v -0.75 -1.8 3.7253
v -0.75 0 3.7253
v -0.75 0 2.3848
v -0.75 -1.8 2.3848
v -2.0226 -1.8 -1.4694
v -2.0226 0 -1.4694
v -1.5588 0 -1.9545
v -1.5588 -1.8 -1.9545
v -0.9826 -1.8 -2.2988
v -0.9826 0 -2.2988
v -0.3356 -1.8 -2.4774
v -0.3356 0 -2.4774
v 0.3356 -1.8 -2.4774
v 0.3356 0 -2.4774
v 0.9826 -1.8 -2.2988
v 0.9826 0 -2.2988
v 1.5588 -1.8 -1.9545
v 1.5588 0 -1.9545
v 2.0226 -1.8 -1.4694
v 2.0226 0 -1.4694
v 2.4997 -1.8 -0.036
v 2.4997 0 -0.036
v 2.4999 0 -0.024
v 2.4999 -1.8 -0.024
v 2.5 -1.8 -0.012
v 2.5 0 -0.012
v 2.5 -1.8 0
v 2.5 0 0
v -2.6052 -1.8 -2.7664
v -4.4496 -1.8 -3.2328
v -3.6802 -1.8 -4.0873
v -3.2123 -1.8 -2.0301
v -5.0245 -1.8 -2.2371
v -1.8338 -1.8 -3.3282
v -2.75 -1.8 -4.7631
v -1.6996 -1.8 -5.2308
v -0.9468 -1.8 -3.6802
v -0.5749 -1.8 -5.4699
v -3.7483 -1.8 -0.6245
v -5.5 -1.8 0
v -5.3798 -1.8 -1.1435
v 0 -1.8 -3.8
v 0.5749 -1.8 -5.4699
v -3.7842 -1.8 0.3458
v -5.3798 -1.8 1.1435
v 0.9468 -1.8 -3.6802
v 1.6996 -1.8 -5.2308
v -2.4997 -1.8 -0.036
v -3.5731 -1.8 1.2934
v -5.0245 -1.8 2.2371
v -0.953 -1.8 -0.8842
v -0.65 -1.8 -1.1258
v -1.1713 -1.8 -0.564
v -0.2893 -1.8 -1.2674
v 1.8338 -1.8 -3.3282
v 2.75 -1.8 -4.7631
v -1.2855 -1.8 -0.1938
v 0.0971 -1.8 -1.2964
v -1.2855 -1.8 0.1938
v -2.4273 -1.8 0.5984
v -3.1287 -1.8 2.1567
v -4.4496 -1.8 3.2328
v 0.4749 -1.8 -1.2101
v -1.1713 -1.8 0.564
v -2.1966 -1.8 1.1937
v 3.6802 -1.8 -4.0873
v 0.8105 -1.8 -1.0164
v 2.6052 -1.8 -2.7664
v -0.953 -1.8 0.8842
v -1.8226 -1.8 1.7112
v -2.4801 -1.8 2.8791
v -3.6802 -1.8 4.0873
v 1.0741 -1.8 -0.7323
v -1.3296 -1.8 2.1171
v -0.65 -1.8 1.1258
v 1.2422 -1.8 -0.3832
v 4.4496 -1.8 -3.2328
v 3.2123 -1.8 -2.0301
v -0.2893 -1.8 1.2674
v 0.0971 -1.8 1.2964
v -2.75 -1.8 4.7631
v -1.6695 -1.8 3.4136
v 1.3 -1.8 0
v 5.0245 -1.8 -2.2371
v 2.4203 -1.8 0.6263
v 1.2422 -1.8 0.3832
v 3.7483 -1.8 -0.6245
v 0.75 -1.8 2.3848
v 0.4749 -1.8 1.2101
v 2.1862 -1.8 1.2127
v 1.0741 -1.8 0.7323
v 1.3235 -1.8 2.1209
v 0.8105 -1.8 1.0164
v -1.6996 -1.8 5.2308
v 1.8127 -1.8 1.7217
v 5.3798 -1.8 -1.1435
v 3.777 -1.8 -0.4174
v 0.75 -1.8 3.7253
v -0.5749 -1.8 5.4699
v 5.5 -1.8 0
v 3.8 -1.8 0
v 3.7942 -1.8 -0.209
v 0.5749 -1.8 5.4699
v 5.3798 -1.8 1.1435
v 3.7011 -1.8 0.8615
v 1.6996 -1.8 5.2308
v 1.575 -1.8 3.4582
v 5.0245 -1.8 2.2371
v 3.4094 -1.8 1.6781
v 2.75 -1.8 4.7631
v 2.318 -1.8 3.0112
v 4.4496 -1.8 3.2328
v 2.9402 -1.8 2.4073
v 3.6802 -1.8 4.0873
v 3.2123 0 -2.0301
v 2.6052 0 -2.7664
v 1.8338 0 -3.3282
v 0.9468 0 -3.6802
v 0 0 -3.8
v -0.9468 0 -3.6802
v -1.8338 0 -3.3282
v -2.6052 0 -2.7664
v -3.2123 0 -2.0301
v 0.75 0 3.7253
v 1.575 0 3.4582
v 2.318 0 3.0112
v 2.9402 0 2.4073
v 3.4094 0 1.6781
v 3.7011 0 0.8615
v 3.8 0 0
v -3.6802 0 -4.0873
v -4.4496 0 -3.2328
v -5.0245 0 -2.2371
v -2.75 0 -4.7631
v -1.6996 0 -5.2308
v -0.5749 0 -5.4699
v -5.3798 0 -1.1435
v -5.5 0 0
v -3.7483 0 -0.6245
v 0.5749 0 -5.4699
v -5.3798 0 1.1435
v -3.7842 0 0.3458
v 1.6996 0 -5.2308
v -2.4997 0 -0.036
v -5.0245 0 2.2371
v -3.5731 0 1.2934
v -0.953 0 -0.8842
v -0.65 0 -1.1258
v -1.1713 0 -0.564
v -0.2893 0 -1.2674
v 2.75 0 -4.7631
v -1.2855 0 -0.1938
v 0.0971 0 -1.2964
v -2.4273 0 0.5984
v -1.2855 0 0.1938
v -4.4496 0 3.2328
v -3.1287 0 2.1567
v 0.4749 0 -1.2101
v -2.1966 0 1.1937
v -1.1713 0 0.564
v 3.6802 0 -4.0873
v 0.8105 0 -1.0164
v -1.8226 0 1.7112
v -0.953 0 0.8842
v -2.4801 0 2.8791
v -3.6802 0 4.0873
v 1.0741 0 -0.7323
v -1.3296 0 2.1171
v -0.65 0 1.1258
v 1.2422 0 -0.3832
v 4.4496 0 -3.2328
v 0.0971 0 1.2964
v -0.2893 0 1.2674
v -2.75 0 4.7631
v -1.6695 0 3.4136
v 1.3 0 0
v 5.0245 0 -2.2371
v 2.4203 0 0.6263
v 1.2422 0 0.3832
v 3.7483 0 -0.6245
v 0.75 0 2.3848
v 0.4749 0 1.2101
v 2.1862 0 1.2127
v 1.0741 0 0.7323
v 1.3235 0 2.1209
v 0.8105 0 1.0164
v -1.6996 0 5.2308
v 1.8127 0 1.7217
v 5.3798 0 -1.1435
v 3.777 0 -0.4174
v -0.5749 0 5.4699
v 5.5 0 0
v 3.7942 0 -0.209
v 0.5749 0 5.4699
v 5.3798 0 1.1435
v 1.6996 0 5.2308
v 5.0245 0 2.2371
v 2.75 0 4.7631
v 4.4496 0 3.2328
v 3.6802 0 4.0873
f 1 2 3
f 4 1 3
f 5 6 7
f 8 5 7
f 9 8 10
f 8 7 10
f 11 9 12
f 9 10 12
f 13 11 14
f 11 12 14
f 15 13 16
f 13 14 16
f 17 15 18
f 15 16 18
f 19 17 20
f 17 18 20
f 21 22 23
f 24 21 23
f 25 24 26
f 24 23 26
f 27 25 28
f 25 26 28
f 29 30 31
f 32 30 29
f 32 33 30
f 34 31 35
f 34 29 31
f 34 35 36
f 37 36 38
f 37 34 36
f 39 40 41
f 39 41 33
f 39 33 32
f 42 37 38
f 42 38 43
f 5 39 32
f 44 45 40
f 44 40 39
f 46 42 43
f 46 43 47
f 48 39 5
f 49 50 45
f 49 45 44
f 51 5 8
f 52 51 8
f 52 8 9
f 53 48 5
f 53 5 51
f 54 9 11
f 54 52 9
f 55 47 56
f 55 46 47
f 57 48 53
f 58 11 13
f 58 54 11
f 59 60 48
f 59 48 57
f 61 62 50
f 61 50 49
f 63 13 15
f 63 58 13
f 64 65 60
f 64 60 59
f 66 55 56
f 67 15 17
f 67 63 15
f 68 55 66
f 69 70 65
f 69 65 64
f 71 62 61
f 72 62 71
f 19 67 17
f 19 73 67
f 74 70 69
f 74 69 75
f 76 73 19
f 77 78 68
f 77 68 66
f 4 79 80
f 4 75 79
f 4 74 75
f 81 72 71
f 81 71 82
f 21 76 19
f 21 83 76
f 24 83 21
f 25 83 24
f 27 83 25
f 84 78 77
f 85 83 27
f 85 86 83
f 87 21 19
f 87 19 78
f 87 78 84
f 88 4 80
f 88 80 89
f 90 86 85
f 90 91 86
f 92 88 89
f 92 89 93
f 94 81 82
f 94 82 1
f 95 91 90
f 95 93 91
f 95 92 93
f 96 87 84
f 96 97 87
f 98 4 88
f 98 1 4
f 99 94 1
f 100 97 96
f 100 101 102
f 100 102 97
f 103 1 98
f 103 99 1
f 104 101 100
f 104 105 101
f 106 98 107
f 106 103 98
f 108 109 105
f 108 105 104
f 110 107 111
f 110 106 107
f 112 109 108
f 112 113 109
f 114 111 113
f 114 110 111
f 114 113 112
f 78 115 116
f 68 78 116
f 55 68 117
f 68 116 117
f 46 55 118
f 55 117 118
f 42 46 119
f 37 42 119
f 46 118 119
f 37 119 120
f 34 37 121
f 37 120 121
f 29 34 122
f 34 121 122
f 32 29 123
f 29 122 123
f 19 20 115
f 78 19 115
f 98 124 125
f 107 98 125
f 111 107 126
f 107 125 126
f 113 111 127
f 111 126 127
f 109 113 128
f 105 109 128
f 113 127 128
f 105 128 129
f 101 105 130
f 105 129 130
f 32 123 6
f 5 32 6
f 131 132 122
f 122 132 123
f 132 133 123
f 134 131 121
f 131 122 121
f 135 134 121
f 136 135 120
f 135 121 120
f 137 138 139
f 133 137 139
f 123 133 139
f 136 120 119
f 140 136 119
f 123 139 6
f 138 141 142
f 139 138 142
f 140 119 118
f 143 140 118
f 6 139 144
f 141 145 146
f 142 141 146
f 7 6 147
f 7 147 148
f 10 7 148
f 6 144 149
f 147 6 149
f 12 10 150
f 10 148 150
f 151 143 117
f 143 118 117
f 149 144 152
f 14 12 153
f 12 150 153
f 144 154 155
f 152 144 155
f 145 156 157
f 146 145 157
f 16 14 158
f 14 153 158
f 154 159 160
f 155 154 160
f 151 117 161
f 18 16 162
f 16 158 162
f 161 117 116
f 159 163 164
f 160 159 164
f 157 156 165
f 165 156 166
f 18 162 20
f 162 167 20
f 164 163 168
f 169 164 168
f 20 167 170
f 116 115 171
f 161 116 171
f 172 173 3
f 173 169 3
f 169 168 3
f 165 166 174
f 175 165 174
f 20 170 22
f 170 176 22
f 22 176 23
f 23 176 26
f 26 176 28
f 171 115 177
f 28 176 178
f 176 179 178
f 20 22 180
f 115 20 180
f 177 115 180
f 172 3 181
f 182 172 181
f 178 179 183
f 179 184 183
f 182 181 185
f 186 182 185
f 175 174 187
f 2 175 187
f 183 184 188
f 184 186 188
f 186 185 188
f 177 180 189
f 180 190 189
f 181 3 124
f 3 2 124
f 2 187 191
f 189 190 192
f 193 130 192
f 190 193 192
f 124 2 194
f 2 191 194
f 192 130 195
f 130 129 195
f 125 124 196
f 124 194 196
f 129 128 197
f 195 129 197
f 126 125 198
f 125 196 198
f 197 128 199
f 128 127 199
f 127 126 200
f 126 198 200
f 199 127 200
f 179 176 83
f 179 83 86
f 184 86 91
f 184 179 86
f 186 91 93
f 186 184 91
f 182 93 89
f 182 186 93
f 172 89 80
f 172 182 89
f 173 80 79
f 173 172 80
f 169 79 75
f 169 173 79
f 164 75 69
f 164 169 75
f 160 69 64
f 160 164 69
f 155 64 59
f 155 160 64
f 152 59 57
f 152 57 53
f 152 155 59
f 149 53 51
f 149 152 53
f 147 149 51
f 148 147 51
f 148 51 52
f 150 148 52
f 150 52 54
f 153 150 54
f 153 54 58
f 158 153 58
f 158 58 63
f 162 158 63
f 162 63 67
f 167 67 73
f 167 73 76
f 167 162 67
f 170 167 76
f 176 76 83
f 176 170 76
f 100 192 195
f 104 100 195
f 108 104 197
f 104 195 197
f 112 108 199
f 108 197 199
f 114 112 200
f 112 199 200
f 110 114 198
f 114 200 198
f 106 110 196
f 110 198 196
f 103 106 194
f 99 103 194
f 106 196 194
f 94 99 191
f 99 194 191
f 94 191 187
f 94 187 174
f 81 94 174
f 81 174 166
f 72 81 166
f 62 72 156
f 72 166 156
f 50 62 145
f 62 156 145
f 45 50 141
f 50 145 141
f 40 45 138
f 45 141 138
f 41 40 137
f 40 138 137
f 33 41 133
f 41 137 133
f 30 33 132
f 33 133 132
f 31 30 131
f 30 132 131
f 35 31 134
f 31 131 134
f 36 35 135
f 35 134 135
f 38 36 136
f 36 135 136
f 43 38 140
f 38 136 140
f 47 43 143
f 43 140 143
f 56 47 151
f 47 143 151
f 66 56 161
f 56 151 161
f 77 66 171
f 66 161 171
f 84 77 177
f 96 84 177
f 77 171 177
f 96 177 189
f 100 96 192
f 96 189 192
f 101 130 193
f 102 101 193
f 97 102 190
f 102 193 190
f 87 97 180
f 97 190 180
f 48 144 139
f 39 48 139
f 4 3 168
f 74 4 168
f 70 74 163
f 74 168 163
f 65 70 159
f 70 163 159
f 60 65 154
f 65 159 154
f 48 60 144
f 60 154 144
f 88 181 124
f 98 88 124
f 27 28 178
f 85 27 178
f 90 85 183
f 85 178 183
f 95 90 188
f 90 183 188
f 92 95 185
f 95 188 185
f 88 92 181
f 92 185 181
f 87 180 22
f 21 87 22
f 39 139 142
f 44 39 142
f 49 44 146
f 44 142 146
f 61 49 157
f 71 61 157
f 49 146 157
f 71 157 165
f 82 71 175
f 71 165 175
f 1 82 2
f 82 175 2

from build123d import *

# Parameters (mm, degrees)
F0_R     = 5.5
F0_R_2   = 1.3
F1_DEPTH = 1.8


with BuildPart() as f1:
    # F0 (on Front) → F1 (new body)
    with BuildSketch(Plane.XZ):
        Circle(F0_R)
        with BuildLine():
            ThreePointArc((-0.75, 3.725252), (0, 3.8), (0.75, 3.725252))
            ThreePointArc((0.75, 3.725252), (2.940238, 2.407281), (3.8, 0))
            ThreePointArc((3.8, 0), (3.787062, -0.313306), (3.748337, -0.624478))
            ThreePointArc((3.748337, -0.624478), (3.550562, -1.354072), (3.212284, -2.030082))
            ThreePointArc((3.212284, -2.030082), (0, -3.8), (-3.212284, -2.030082))
            ThreePointArc((-3.212284, -2.030082), (-3.550562, -1.354072), (-3.748337, -0.624478))
            ThreePointArc((-3.748337, -0.624478), (-3.128705, 2.156665), (-0.75, 3.725252))
        make_face(mode=Mode.SUBTRACT)
        with BuildLine():
            Line((3.748337, -0.624478), (2.499741, -0.036019))
            ThreePointArc((2.499741, -0.036019), (2.372029, -0.789606), (2.022598, -1.469387))
            Line((2.022598, -1.469387), (3.212284, -2.030082))
            ThreePointArc((3.212284, -2.030082), (3.550562, -1.354072), (3.748337, -0.624478))
        make_face()
        with BuildLine():
            ThreePointArc((-0.75, 2.384848), (0, 2.5), (0.75, 2.384848))
            Line((0.75, 2.384848), (0.75, 3.725252))
            ThreePointArc((0.75, 3.725252), (0, 3.8), (-0.75, 3.725252))
            Line((-0.75, 3.725252), (-0.75, 2.384848))
        make_face()
        with BuildLine():
            ThreePointArc((-2.022598, -1.469387), (-2.372029, -0.789606), (-2.499741, -0.036019))
            Line((-2.499741, -0.036019), (-3.748337, -0.624478))
            ThreePointArc((-3.748337, -0.624478), (-3.550562, -1.354072), (-3.212284, -2.030082))
            Line((-3.212284, -2.030082), (-2.022598, -1.469387))
        make_face()
        with BuildLine():
            ThreePointArc((2.499741, -0.036019), (2.499935, -0.01801), (2.5, 0))
            ThreePointArc((2.5, 0), (2.015564, 1.47902), (0.75, 2.384848))
            ThreePointArc((0.75, 2.384848), (0, 2.5), (-0.75, 2.384848))
            ThreePointArc((-0.75, 2.384848), (-2.026167, 1.464462), (-2.499741, -0.036019))
            ThreePointArc((-2.499741, -0.036019), (-2.372029, -0.789606), (-2.022598, -1.469387))
            ThreePointArc((-2.022598, -1.469387), (0, -2.5), (2.022598, -1.469387))
            ThreePointArc((2.022598, -1.469387), (2.372029, -0.789606), (2.499741, -0.036019))
        make_face()
        Circle(F0_R_2, mode=Mode.SUBTRACT)
    extrude(amount=F1_DEPTH)


solid = f1.part
